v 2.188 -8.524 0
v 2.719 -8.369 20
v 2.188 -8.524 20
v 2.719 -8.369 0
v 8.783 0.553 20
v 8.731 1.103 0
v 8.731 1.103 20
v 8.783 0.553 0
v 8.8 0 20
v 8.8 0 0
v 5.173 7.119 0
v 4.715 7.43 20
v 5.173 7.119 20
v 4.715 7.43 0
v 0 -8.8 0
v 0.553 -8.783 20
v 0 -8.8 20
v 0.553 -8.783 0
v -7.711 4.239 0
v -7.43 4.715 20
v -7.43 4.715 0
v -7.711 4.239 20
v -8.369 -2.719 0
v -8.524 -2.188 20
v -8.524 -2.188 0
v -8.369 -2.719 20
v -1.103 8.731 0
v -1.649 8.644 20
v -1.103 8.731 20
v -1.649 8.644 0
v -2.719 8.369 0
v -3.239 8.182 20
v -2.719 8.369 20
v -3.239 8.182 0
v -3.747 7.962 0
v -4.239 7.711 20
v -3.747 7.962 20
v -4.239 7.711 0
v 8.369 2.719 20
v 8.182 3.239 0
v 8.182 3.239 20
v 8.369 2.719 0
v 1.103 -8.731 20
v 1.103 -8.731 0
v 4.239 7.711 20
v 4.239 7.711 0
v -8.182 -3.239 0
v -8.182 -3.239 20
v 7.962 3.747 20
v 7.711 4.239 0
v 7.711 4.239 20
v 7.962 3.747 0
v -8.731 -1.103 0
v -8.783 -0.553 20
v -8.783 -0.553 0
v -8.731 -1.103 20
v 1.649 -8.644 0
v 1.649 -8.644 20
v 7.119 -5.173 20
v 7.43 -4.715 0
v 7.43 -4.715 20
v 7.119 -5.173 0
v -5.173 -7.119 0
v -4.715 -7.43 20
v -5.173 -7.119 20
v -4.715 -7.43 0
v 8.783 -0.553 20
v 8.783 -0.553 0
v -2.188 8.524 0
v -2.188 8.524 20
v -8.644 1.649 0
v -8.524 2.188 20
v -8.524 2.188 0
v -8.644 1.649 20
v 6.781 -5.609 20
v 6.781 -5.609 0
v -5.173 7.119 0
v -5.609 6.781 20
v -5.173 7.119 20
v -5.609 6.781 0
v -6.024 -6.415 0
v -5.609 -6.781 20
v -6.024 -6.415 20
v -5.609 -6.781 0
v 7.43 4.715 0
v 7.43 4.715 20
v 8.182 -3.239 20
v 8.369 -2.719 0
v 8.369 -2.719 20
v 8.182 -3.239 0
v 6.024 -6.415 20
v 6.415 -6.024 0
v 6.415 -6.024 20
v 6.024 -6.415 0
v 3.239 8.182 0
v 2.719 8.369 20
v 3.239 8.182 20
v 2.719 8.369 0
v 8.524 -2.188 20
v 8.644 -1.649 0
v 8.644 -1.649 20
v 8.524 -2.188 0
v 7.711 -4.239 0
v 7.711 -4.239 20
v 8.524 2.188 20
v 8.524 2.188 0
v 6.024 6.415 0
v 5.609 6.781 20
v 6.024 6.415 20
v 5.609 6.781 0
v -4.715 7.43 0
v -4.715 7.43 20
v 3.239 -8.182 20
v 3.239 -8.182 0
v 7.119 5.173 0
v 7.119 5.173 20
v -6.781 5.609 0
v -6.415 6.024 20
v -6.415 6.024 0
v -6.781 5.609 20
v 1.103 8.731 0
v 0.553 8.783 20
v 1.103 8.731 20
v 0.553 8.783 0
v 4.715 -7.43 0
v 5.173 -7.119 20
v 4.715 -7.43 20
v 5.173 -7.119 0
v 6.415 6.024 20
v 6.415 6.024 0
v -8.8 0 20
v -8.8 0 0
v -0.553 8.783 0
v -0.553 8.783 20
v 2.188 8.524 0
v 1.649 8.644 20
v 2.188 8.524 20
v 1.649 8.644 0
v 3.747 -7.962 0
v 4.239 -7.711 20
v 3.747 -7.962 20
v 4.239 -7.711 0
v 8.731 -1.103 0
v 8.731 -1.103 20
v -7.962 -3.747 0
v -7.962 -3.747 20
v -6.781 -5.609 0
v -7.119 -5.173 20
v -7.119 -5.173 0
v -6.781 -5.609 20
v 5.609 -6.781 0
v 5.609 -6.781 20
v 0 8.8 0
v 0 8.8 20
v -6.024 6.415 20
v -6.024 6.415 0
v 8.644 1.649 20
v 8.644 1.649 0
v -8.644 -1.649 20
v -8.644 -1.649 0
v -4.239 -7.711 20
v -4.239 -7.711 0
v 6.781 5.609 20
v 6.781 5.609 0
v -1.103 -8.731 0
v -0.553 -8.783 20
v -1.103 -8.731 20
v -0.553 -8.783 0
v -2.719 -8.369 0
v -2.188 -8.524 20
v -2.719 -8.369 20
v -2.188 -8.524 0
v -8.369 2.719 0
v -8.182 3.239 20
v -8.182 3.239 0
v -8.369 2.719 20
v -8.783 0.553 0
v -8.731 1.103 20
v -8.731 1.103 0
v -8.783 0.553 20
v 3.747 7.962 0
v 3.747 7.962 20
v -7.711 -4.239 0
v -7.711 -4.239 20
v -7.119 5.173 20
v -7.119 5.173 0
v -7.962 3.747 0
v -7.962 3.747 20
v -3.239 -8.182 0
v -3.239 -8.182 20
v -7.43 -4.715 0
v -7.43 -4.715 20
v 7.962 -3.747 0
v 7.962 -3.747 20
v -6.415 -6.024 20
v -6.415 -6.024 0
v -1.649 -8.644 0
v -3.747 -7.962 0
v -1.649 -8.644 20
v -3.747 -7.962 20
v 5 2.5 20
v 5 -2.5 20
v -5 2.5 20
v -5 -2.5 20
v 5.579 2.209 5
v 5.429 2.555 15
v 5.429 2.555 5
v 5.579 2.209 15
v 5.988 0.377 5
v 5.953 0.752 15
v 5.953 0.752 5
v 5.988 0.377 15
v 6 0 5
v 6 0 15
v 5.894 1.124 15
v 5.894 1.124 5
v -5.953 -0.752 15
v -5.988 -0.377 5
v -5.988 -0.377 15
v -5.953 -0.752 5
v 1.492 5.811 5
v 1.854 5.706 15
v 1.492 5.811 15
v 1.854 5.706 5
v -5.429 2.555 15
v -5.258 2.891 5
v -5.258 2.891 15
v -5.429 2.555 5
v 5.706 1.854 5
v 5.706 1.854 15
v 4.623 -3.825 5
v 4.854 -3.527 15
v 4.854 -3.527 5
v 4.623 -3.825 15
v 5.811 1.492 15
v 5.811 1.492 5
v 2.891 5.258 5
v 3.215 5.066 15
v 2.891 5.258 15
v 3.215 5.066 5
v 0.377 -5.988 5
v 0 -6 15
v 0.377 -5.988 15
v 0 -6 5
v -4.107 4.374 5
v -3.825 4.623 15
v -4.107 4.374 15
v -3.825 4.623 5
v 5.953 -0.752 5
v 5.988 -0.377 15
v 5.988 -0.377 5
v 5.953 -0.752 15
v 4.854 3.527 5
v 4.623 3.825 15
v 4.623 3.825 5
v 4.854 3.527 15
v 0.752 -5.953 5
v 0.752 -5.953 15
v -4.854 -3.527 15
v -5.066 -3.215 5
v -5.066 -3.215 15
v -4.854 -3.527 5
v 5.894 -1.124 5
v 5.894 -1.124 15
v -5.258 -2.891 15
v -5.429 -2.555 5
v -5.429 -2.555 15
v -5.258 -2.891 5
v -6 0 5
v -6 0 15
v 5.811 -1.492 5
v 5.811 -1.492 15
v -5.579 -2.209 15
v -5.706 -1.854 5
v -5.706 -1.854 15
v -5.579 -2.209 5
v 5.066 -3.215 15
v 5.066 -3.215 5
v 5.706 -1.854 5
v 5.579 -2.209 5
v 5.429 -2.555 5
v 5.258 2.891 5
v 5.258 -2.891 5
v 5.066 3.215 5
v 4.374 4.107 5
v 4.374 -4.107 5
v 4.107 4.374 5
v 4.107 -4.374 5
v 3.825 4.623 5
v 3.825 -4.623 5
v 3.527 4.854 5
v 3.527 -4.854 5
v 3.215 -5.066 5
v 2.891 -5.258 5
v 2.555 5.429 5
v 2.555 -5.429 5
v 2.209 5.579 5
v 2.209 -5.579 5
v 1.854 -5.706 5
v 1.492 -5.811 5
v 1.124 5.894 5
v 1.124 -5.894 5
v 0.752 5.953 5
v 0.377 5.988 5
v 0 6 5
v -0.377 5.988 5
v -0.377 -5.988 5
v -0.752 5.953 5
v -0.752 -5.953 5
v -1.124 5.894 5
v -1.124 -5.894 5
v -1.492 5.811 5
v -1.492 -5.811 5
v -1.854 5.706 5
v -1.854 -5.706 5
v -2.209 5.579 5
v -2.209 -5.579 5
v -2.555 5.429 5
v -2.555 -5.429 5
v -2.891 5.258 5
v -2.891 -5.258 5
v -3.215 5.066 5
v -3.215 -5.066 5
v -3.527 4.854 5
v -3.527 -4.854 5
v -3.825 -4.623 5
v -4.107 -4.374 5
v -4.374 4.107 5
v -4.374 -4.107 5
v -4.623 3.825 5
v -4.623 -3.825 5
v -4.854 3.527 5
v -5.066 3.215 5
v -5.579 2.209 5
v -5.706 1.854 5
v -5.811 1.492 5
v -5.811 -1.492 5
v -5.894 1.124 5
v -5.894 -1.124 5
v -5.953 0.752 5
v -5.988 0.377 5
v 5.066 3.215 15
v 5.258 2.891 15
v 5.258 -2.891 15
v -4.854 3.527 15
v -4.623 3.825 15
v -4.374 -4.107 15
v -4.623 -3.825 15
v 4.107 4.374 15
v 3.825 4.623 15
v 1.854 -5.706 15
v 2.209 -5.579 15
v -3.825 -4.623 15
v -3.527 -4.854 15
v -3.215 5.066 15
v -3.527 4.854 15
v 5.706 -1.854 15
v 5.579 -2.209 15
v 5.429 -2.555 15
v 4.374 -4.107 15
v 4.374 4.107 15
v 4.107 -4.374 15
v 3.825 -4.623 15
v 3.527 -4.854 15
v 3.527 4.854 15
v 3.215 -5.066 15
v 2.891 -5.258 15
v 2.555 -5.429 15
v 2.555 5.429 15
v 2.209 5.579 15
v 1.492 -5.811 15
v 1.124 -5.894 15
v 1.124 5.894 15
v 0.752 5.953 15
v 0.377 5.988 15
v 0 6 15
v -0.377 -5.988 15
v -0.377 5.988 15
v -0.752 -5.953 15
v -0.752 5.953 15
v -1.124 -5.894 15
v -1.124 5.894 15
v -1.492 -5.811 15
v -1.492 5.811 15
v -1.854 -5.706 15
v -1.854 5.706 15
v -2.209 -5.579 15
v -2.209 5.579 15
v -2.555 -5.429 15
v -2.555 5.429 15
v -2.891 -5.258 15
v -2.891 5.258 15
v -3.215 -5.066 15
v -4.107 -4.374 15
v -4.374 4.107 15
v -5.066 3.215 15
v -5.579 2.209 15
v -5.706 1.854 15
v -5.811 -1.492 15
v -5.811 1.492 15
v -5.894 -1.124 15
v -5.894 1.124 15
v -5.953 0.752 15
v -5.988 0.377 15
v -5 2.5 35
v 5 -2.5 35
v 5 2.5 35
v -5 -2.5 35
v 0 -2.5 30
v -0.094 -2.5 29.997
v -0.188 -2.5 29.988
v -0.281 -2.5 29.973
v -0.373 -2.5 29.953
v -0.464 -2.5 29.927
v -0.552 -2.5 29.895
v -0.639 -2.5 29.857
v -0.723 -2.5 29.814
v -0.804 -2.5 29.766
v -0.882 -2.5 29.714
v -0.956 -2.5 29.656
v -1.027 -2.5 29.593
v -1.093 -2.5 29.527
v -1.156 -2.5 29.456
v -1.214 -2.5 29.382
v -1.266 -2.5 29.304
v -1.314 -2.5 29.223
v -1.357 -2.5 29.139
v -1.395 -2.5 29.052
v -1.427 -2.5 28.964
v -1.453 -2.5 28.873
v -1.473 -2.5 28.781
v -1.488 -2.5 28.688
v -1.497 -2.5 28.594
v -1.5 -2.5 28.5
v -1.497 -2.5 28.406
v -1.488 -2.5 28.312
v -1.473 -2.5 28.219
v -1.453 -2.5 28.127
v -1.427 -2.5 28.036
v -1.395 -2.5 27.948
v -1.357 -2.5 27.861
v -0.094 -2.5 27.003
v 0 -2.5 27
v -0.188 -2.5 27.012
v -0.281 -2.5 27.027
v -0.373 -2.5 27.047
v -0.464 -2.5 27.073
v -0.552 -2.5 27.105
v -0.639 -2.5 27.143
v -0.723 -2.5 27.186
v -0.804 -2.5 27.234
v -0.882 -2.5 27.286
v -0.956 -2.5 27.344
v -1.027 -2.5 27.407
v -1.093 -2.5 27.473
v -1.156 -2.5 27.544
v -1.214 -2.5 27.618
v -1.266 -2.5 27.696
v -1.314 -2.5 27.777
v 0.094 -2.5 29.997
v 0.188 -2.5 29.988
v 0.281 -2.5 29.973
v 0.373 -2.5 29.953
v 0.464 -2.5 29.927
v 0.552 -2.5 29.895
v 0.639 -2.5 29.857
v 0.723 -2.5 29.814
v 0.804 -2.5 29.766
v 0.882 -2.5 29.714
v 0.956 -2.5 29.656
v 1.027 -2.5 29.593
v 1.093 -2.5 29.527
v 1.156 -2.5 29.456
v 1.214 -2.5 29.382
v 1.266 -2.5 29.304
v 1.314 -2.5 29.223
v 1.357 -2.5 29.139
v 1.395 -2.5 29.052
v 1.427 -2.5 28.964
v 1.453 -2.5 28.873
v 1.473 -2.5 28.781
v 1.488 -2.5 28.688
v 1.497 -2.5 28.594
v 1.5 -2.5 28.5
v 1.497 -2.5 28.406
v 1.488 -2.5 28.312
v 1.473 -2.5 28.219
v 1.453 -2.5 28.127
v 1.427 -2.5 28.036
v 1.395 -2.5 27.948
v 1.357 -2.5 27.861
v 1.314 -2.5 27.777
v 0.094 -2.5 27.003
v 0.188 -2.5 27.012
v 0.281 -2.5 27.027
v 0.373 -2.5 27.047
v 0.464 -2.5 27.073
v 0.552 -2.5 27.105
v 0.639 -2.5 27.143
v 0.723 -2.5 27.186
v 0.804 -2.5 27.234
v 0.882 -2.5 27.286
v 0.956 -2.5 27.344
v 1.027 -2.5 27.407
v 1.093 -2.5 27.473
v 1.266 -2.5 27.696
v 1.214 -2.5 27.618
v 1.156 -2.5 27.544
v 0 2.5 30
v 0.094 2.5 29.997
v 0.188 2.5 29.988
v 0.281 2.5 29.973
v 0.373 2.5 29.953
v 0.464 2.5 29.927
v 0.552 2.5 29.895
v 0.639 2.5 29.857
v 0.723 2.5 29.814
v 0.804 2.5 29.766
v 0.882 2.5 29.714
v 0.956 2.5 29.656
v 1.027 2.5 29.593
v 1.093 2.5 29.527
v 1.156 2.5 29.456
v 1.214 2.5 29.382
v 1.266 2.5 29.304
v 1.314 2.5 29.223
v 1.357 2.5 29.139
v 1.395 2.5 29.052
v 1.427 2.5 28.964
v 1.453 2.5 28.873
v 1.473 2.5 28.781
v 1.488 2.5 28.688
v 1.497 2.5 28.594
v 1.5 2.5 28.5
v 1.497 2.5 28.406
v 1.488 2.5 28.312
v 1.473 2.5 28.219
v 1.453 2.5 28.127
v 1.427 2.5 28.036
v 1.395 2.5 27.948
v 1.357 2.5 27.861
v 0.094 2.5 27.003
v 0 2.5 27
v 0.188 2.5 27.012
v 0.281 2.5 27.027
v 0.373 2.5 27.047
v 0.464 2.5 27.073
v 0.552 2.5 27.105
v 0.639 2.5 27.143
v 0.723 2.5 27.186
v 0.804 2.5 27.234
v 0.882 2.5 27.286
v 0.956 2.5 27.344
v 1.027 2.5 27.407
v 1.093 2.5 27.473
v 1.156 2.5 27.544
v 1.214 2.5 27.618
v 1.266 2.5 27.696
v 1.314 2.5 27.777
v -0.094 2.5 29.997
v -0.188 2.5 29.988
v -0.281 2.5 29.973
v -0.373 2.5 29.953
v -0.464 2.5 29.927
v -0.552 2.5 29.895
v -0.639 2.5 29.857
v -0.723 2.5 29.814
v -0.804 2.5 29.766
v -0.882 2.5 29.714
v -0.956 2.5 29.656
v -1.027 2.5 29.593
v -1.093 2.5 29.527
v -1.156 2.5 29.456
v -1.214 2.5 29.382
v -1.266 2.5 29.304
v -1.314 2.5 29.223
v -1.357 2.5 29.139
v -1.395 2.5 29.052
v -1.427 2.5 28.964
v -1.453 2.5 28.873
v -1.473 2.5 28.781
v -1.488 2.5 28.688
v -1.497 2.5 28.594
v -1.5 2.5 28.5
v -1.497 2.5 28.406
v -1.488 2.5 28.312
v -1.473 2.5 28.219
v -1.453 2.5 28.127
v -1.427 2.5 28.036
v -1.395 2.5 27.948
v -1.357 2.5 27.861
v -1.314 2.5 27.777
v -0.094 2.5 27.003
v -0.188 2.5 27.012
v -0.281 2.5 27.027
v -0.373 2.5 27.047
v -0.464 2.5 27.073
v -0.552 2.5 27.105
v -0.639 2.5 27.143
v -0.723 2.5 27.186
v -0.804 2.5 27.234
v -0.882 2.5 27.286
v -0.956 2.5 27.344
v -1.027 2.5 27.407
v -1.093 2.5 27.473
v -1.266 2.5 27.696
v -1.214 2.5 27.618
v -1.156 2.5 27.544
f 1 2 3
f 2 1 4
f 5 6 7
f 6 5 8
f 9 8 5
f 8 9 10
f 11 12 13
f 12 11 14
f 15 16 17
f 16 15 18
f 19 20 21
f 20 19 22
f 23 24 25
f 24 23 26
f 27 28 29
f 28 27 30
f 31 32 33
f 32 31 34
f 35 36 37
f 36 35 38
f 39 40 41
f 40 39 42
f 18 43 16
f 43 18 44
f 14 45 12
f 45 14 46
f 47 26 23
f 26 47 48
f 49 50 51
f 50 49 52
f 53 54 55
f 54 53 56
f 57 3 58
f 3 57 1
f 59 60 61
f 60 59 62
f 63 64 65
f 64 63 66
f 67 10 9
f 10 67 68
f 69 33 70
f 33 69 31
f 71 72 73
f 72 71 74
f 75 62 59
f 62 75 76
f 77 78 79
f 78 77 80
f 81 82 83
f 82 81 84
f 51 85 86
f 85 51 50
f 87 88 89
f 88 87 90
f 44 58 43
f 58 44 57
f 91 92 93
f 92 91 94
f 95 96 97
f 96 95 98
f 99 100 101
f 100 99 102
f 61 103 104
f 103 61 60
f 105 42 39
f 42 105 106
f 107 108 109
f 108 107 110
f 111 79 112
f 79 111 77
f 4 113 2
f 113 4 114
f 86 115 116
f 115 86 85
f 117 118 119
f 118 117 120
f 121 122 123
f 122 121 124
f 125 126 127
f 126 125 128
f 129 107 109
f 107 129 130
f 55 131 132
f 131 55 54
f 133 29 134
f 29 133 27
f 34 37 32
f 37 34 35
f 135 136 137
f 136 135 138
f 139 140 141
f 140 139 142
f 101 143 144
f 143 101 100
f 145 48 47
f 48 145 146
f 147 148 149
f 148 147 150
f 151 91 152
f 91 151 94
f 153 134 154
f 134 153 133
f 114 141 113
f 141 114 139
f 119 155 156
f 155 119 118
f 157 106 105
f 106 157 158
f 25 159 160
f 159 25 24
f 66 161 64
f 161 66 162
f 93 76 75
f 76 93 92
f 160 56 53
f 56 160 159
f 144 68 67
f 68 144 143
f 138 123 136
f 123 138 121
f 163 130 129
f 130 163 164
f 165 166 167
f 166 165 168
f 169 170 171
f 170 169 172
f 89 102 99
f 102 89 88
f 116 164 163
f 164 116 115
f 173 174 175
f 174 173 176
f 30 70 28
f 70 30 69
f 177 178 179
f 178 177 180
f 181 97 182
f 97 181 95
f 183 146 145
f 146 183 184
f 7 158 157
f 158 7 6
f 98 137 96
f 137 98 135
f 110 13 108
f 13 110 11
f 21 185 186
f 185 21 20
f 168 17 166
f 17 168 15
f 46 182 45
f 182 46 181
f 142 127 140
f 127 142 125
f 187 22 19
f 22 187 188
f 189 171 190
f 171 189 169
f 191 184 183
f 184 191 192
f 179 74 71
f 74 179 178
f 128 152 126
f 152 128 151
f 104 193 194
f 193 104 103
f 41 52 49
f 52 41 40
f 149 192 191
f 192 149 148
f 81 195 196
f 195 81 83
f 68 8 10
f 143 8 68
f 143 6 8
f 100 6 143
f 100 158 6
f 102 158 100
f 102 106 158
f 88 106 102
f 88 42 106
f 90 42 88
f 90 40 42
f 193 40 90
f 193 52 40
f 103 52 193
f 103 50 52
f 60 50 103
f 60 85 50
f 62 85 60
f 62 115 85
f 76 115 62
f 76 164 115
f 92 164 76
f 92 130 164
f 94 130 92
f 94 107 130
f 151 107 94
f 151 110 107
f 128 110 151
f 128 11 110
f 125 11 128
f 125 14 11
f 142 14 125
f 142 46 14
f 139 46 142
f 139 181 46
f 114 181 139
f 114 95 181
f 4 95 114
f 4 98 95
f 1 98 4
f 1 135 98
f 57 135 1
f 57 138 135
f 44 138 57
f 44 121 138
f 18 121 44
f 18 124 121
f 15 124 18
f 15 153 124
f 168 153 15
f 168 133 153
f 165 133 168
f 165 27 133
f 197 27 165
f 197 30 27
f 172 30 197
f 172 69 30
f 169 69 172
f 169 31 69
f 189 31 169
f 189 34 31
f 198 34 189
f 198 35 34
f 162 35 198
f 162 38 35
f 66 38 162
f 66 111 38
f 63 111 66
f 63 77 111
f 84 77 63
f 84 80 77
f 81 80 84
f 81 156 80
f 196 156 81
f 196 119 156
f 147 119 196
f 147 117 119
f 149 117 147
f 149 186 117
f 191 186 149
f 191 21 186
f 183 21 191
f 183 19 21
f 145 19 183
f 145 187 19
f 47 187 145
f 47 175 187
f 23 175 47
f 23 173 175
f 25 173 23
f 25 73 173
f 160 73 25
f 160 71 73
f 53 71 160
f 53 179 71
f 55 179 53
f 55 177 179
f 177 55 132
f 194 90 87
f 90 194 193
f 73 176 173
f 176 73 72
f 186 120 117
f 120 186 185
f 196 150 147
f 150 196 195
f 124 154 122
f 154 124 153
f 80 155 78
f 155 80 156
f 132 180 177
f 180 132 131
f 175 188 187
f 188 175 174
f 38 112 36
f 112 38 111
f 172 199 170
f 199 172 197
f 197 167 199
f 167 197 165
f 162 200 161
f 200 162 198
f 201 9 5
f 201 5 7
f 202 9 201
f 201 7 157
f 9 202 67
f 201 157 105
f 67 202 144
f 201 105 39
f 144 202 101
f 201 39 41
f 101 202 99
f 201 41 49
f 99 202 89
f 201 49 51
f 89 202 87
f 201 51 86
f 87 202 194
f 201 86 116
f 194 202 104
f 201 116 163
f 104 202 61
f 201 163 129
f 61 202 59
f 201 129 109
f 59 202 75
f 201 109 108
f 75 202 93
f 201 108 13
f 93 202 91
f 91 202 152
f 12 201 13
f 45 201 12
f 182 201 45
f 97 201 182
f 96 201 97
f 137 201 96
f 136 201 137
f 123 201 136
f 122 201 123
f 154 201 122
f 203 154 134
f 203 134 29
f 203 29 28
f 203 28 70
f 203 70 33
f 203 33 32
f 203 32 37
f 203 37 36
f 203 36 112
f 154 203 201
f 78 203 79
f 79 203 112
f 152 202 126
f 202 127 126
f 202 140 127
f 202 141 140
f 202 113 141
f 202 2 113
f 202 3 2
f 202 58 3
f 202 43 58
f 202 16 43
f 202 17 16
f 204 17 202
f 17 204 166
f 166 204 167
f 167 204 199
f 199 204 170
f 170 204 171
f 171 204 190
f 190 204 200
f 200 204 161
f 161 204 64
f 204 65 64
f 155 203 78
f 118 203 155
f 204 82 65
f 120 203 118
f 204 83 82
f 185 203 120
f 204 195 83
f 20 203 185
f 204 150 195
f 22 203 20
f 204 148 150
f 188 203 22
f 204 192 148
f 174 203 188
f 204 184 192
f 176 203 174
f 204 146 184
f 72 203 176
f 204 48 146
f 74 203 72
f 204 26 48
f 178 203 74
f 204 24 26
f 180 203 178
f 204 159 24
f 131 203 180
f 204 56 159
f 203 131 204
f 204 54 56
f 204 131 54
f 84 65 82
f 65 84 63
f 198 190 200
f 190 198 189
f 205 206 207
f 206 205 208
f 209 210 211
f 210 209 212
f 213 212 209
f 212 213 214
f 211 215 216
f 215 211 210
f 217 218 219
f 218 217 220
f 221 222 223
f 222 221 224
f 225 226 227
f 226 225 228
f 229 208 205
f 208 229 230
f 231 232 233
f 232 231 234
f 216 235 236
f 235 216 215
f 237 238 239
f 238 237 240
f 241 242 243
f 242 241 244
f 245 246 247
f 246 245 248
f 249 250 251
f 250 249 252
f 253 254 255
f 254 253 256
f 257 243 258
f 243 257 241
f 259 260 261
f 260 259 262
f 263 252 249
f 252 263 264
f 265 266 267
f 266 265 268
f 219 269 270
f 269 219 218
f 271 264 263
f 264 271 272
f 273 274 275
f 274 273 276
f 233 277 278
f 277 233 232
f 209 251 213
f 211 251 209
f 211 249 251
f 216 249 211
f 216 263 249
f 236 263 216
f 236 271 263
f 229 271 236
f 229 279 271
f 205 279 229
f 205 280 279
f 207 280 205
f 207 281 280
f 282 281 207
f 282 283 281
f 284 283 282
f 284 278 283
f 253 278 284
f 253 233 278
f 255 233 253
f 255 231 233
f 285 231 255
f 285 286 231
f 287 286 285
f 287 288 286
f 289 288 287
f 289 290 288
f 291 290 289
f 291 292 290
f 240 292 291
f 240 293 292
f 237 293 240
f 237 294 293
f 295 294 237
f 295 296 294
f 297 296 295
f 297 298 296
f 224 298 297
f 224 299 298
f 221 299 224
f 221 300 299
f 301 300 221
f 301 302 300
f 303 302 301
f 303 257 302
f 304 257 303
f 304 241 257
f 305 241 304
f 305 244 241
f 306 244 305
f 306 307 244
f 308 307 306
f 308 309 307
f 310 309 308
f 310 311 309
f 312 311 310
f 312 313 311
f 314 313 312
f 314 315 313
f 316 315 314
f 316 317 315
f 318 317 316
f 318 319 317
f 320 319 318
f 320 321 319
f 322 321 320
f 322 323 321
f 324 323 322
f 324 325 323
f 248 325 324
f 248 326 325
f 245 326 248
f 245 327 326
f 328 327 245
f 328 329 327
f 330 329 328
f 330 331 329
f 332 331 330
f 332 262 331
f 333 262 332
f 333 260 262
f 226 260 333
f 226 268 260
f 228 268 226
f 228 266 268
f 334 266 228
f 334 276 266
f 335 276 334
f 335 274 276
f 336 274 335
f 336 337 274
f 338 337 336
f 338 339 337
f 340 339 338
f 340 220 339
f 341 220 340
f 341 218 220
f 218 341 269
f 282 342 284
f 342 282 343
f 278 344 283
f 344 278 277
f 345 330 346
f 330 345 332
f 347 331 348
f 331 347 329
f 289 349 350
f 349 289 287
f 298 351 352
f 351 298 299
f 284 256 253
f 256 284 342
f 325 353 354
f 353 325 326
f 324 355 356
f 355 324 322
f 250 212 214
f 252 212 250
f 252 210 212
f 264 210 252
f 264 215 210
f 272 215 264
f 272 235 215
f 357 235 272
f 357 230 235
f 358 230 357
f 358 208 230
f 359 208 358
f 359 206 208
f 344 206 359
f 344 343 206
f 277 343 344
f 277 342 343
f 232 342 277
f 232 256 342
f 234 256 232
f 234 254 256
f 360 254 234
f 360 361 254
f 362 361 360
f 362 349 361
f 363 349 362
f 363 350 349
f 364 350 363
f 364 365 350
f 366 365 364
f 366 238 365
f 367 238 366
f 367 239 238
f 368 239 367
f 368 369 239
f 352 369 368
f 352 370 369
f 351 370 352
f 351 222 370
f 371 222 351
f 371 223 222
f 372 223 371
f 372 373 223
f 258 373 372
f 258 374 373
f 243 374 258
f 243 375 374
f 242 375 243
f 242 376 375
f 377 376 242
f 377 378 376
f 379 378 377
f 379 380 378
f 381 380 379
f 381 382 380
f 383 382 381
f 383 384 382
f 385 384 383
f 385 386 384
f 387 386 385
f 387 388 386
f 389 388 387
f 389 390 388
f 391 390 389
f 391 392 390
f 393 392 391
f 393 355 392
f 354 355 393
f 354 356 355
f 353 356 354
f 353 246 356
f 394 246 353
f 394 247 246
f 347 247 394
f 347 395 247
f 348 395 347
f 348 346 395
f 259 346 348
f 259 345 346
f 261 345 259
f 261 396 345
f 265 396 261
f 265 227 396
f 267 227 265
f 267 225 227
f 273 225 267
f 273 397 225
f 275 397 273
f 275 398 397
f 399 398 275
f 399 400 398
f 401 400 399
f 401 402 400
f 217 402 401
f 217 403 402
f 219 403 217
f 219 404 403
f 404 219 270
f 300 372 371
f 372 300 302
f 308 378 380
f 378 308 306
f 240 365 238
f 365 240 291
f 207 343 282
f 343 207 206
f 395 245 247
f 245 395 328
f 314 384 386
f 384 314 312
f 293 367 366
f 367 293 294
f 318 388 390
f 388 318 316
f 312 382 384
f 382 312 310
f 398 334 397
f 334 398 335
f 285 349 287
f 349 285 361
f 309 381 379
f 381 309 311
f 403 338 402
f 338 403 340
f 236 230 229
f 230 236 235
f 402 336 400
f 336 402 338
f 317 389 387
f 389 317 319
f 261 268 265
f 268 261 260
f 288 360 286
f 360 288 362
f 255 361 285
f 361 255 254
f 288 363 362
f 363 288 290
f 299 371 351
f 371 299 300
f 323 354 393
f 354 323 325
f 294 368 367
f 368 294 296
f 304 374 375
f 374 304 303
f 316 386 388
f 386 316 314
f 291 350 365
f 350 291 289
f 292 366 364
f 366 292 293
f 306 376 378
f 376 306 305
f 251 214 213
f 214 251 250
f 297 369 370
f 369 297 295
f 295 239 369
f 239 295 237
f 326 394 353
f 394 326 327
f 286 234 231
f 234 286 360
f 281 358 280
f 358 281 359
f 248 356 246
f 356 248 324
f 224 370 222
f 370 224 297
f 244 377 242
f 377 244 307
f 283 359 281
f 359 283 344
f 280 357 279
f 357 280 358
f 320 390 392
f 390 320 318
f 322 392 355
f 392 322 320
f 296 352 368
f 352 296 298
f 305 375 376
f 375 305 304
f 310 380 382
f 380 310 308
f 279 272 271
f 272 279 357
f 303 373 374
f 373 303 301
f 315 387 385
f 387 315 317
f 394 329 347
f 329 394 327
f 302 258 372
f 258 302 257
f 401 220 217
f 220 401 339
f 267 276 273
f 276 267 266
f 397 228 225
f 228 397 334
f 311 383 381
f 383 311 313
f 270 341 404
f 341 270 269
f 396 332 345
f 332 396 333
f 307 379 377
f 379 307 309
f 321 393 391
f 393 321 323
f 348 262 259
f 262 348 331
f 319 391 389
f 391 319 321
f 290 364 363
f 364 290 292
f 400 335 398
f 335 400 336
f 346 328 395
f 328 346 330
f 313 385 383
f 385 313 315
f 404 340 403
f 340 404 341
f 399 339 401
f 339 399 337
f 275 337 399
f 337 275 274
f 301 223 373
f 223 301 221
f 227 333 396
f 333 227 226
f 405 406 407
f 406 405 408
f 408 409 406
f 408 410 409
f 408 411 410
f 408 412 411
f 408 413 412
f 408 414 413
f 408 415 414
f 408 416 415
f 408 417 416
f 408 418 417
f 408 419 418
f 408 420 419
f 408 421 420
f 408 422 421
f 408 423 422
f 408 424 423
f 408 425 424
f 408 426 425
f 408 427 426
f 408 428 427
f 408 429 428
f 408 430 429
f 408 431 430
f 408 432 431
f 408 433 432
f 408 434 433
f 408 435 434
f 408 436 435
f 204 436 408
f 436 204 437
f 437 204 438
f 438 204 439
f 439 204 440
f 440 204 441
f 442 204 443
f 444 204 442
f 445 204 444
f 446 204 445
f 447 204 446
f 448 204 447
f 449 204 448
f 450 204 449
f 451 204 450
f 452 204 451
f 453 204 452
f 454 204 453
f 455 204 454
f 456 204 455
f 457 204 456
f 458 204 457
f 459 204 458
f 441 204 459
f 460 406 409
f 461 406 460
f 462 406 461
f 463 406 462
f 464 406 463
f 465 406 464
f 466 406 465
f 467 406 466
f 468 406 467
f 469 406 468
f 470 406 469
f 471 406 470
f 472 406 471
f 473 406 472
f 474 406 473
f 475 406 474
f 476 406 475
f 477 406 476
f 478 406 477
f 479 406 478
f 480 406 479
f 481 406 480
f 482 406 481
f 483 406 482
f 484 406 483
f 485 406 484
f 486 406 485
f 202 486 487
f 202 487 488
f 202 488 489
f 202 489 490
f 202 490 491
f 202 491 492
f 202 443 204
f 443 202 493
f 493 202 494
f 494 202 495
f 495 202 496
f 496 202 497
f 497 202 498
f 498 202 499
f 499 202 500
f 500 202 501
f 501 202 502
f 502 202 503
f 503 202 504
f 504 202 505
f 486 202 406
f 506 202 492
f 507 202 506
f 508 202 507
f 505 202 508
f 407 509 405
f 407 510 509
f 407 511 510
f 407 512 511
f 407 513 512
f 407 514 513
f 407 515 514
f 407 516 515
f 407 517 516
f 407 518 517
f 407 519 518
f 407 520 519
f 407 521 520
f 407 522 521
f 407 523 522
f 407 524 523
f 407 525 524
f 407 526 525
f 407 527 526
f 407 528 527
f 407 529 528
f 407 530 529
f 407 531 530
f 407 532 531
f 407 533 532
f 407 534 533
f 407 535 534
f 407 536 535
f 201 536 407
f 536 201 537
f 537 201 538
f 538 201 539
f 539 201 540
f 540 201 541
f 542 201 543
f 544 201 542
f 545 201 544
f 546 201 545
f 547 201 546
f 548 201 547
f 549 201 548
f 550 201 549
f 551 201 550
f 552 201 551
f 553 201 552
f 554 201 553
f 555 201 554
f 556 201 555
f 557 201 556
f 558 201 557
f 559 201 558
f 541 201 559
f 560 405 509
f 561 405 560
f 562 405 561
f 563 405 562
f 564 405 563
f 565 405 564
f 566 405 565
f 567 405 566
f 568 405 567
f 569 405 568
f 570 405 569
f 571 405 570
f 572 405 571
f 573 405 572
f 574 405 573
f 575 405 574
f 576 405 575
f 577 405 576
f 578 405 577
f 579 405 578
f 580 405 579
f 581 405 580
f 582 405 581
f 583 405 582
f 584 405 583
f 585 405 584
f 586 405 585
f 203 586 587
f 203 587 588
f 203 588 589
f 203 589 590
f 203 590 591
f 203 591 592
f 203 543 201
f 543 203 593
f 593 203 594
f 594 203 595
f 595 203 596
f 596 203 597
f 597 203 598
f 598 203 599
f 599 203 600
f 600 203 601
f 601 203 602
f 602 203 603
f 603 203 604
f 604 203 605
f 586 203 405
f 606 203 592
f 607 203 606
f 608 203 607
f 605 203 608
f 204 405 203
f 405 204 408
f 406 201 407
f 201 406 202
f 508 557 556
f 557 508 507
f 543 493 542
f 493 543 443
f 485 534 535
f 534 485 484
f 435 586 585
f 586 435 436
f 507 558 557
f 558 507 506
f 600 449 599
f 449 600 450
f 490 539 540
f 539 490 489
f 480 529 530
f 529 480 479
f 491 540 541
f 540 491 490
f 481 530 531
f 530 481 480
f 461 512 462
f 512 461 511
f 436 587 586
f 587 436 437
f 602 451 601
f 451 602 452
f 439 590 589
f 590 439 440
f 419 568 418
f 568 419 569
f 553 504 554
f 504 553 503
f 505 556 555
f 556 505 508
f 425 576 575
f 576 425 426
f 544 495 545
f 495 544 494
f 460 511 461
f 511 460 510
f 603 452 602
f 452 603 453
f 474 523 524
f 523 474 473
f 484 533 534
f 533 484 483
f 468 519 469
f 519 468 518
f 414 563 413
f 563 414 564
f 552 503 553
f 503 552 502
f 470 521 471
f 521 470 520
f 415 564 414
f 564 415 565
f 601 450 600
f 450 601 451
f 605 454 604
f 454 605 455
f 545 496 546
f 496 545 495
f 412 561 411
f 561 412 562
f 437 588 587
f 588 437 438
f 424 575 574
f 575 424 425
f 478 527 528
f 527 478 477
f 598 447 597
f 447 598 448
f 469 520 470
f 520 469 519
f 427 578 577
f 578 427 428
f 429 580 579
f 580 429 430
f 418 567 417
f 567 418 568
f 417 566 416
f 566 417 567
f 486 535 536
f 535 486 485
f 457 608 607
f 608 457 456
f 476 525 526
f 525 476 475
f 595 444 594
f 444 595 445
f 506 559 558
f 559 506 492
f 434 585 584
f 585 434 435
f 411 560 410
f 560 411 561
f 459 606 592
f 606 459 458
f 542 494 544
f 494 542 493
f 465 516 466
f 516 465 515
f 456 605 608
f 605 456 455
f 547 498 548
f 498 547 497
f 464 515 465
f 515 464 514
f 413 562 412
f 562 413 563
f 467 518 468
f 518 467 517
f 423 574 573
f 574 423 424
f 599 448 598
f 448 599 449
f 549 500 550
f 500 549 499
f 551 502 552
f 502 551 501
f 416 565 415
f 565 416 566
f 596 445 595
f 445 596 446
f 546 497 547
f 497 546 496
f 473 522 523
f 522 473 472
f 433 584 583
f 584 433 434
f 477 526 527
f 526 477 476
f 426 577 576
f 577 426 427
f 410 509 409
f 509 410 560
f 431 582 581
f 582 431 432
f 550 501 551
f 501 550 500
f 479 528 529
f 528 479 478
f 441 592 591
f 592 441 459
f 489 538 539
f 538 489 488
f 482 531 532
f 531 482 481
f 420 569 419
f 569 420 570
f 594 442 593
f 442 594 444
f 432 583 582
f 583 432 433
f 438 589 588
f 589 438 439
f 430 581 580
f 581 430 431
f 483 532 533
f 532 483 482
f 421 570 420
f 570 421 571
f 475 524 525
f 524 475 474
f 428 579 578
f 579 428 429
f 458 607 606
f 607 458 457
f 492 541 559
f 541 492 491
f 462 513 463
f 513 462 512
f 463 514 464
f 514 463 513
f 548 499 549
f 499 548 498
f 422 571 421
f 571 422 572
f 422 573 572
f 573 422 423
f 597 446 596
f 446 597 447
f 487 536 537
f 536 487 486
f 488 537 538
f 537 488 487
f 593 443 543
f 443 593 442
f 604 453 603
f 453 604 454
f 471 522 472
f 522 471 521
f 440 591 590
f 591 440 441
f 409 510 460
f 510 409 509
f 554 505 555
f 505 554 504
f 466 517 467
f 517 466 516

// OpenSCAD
//*******************************************************
// ********** Prusa Rounded Clip by MacFly **************
// **            made dec 02 2015                      **
//*******************************************************

//--------------------------------------------------------------------------------------//
$fn = 100;

CYLINDER_HEIGHT = 20;         // cylinder height mm - Hauteur du cylindre en mm
CYLINDER_RADIUS = 8.80;      // cylinder radius mm - Rayon du cylindre en mm
TAB_LENGTH = 15;            //  Tab length - longueur de la languette en mm
TAB_THICKNESS = 5;         // 5mm thickness - Epaisseur de la languette
TAB_WIDTH = 10;           // Tab width mm - Largeur de la languette en mm
SCREW_HOLE_RADIUS = 1.5; // screw hole radius - Diamètre du trou pour la vis
SCREW_HOLE_OFFSET = 5; // tab screw hole 5mm from the edge - distance du trou 5mm du bord extérieur
EXTRUSION_THICKNESS = 6; // 8.80 - 6 = 2.8 / 2 = 1.4mm shell thickness - Epaisseur de l'extrusion intérieur du cylindre

module cylindre()
    {
    difference()
        {
                cylinder(r=CYLINDER_RADIUS, h=CYLINDER_HEIGHT);
                translate([0,0,5]) extruCylinder();
        }
    }
    
module extruCylinder()
    {
                #cylinder(r=EXTRUSION_THICKNESS, h=CYLINDER_HEIGHT - 10);  
    }
    
module  tab()
    {
     difference() {
                  
            translate([0,0,0]) rotate([90,90,0]) cube([TAB_LENGTH,TAB_WIDTH,TAB_THICKNESS]);
            translate([5, 75, -SCREW_HOLE_OFFSET - 1.5]) rotate([90,90,0]) #cylinder(r=SCREW_HOLE_RADIUS,h=150);
     }
  }

cylindre();
translate([-TAB_WIDTH/2,TAB_THICKNESS/2,CYLINDER_HEIGHT + TAB_LENGTH]) tab();

